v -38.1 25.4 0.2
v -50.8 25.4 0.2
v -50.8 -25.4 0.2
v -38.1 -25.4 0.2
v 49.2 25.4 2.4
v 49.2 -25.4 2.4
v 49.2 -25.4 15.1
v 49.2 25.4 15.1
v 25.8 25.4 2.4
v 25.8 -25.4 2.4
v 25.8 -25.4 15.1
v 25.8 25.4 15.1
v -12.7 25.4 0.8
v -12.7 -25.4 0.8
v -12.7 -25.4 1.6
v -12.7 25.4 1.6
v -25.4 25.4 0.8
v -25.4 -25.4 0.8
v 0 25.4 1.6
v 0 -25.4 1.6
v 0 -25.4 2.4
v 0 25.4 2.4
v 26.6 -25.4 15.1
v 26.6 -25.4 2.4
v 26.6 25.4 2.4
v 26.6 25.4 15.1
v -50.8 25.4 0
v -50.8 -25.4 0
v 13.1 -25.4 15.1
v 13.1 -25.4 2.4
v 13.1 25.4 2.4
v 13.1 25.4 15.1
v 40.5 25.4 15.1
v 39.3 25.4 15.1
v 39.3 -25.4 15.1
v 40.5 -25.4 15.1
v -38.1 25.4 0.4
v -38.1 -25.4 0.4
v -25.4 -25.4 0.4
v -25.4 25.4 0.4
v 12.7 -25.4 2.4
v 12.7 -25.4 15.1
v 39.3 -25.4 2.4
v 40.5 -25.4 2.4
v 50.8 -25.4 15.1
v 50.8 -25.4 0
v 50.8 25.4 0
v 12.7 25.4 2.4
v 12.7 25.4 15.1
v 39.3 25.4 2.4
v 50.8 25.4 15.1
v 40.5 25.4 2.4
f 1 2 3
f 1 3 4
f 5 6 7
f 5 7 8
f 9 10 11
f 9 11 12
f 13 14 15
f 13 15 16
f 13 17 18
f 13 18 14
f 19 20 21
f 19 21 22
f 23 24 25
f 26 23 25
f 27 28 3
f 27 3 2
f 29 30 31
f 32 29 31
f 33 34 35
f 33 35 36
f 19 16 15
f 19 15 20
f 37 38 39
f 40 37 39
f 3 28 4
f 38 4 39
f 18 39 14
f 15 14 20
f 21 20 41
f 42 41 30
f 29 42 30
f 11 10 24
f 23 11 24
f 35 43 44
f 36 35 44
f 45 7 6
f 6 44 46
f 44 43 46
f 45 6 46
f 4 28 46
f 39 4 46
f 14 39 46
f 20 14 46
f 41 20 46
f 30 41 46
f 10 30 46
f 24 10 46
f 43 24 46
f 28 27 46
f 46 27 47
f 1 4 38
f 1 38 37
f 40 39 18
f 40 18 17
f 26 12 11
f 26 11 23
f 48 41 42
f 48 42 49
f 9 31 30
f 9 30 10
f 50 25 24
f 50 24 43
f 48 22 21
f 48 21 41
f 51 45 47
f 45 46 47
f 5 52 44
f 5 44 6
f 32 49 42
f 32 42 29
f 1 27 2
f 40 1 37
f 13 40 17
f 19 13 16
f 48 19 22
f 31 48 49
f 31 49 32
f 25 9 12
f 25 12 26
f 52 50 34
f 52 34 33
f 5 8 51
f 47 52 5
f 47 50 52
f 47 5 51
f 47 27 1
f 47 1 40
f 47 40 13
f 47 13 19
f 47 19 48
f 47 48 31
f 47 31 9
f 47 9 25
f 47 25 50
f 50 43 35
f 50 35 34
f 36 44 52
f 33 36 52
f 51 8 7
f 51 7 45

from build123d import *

# Parameters (mm, degrees)
F0_W      = 101.6
F0_H      = 50.8
F1_DEPTH  = 0.2
F2_W      = 88.9
F2_H      = 50.8
F3_DEPTH  = 0.2
F4_W      = 76.2
F4_H      = 50.8
F5_DEPTH  = 0.4
F6_W      = 63.5
F6_H      = 50.8
F7_DEPTH  = 0.8
F8_W      = 50.8
F8_H      = 50.8
F9_DEPTH  = 0.8
F10_W     = 0.4
F10_H     = 50.8
F10_W_2   = 0.8
F10_W_3   = 1.2
F10_W_4   = 1.6
F11_DEPTH = 12.7


with BuildPart() as f1:
    # F0 (on Top) → F1 (new body)
    with BuildSketch(Plane.XY):
        Rectangle(F0_W, F0_H)
    extrude(amount=F1_DEPTH)

    # F2 (on face) → F3 (join)
    with BuildSketch(Plane.XY.offset(0.2)):
        with Locations((6.35, 0)):
            Rectangle(F2_W, F2_H)
    extrude(amount=F3_DEPTH)

    # F4 (on face) → F5 (join)
    with BuildSketch(Plane.XY.offset(0.4)):
        with Locations((12.7, 0)):
            Rectangle(F4_W, F4_H)
    extrude(amount=F5_DEPTH)

    # F6 (on face) → F7 (join)
    with BuildSketch(Plane.XY.offset(0.8)):
        with Locations((19.05, 0)):
            Rectangle(F6_W, F6_H)
    extrude(amount=F7_DEPTH)

    # F8 (on face) → F9 (join)
    with BuildSketch(Plane.XY.offset(1.6)):
        with Locations((25.4, 0)):
            Rectangle(F8_W, F8_H)
    extrude(amount=F9_DEPTH)

    # F10 (on face) → F11 (join)
    with BuildSketch(Plane.XY.offset(2.4)):
        with Locations((12.9, 0)):
            Rectangle(F10_W, F10_H)
        with Locations((26.2, 0)):
            Rectangle(F10_W_2, F10_H)
        with Locations((39.9, 0)):
            Rectangle(F10_W_3, F10_H)
        with Locations((50, 0)):
            Rectangle(F10_W_4, F10_H)
    extrude(amount=F11_DEPTH)


solid = f1.part
